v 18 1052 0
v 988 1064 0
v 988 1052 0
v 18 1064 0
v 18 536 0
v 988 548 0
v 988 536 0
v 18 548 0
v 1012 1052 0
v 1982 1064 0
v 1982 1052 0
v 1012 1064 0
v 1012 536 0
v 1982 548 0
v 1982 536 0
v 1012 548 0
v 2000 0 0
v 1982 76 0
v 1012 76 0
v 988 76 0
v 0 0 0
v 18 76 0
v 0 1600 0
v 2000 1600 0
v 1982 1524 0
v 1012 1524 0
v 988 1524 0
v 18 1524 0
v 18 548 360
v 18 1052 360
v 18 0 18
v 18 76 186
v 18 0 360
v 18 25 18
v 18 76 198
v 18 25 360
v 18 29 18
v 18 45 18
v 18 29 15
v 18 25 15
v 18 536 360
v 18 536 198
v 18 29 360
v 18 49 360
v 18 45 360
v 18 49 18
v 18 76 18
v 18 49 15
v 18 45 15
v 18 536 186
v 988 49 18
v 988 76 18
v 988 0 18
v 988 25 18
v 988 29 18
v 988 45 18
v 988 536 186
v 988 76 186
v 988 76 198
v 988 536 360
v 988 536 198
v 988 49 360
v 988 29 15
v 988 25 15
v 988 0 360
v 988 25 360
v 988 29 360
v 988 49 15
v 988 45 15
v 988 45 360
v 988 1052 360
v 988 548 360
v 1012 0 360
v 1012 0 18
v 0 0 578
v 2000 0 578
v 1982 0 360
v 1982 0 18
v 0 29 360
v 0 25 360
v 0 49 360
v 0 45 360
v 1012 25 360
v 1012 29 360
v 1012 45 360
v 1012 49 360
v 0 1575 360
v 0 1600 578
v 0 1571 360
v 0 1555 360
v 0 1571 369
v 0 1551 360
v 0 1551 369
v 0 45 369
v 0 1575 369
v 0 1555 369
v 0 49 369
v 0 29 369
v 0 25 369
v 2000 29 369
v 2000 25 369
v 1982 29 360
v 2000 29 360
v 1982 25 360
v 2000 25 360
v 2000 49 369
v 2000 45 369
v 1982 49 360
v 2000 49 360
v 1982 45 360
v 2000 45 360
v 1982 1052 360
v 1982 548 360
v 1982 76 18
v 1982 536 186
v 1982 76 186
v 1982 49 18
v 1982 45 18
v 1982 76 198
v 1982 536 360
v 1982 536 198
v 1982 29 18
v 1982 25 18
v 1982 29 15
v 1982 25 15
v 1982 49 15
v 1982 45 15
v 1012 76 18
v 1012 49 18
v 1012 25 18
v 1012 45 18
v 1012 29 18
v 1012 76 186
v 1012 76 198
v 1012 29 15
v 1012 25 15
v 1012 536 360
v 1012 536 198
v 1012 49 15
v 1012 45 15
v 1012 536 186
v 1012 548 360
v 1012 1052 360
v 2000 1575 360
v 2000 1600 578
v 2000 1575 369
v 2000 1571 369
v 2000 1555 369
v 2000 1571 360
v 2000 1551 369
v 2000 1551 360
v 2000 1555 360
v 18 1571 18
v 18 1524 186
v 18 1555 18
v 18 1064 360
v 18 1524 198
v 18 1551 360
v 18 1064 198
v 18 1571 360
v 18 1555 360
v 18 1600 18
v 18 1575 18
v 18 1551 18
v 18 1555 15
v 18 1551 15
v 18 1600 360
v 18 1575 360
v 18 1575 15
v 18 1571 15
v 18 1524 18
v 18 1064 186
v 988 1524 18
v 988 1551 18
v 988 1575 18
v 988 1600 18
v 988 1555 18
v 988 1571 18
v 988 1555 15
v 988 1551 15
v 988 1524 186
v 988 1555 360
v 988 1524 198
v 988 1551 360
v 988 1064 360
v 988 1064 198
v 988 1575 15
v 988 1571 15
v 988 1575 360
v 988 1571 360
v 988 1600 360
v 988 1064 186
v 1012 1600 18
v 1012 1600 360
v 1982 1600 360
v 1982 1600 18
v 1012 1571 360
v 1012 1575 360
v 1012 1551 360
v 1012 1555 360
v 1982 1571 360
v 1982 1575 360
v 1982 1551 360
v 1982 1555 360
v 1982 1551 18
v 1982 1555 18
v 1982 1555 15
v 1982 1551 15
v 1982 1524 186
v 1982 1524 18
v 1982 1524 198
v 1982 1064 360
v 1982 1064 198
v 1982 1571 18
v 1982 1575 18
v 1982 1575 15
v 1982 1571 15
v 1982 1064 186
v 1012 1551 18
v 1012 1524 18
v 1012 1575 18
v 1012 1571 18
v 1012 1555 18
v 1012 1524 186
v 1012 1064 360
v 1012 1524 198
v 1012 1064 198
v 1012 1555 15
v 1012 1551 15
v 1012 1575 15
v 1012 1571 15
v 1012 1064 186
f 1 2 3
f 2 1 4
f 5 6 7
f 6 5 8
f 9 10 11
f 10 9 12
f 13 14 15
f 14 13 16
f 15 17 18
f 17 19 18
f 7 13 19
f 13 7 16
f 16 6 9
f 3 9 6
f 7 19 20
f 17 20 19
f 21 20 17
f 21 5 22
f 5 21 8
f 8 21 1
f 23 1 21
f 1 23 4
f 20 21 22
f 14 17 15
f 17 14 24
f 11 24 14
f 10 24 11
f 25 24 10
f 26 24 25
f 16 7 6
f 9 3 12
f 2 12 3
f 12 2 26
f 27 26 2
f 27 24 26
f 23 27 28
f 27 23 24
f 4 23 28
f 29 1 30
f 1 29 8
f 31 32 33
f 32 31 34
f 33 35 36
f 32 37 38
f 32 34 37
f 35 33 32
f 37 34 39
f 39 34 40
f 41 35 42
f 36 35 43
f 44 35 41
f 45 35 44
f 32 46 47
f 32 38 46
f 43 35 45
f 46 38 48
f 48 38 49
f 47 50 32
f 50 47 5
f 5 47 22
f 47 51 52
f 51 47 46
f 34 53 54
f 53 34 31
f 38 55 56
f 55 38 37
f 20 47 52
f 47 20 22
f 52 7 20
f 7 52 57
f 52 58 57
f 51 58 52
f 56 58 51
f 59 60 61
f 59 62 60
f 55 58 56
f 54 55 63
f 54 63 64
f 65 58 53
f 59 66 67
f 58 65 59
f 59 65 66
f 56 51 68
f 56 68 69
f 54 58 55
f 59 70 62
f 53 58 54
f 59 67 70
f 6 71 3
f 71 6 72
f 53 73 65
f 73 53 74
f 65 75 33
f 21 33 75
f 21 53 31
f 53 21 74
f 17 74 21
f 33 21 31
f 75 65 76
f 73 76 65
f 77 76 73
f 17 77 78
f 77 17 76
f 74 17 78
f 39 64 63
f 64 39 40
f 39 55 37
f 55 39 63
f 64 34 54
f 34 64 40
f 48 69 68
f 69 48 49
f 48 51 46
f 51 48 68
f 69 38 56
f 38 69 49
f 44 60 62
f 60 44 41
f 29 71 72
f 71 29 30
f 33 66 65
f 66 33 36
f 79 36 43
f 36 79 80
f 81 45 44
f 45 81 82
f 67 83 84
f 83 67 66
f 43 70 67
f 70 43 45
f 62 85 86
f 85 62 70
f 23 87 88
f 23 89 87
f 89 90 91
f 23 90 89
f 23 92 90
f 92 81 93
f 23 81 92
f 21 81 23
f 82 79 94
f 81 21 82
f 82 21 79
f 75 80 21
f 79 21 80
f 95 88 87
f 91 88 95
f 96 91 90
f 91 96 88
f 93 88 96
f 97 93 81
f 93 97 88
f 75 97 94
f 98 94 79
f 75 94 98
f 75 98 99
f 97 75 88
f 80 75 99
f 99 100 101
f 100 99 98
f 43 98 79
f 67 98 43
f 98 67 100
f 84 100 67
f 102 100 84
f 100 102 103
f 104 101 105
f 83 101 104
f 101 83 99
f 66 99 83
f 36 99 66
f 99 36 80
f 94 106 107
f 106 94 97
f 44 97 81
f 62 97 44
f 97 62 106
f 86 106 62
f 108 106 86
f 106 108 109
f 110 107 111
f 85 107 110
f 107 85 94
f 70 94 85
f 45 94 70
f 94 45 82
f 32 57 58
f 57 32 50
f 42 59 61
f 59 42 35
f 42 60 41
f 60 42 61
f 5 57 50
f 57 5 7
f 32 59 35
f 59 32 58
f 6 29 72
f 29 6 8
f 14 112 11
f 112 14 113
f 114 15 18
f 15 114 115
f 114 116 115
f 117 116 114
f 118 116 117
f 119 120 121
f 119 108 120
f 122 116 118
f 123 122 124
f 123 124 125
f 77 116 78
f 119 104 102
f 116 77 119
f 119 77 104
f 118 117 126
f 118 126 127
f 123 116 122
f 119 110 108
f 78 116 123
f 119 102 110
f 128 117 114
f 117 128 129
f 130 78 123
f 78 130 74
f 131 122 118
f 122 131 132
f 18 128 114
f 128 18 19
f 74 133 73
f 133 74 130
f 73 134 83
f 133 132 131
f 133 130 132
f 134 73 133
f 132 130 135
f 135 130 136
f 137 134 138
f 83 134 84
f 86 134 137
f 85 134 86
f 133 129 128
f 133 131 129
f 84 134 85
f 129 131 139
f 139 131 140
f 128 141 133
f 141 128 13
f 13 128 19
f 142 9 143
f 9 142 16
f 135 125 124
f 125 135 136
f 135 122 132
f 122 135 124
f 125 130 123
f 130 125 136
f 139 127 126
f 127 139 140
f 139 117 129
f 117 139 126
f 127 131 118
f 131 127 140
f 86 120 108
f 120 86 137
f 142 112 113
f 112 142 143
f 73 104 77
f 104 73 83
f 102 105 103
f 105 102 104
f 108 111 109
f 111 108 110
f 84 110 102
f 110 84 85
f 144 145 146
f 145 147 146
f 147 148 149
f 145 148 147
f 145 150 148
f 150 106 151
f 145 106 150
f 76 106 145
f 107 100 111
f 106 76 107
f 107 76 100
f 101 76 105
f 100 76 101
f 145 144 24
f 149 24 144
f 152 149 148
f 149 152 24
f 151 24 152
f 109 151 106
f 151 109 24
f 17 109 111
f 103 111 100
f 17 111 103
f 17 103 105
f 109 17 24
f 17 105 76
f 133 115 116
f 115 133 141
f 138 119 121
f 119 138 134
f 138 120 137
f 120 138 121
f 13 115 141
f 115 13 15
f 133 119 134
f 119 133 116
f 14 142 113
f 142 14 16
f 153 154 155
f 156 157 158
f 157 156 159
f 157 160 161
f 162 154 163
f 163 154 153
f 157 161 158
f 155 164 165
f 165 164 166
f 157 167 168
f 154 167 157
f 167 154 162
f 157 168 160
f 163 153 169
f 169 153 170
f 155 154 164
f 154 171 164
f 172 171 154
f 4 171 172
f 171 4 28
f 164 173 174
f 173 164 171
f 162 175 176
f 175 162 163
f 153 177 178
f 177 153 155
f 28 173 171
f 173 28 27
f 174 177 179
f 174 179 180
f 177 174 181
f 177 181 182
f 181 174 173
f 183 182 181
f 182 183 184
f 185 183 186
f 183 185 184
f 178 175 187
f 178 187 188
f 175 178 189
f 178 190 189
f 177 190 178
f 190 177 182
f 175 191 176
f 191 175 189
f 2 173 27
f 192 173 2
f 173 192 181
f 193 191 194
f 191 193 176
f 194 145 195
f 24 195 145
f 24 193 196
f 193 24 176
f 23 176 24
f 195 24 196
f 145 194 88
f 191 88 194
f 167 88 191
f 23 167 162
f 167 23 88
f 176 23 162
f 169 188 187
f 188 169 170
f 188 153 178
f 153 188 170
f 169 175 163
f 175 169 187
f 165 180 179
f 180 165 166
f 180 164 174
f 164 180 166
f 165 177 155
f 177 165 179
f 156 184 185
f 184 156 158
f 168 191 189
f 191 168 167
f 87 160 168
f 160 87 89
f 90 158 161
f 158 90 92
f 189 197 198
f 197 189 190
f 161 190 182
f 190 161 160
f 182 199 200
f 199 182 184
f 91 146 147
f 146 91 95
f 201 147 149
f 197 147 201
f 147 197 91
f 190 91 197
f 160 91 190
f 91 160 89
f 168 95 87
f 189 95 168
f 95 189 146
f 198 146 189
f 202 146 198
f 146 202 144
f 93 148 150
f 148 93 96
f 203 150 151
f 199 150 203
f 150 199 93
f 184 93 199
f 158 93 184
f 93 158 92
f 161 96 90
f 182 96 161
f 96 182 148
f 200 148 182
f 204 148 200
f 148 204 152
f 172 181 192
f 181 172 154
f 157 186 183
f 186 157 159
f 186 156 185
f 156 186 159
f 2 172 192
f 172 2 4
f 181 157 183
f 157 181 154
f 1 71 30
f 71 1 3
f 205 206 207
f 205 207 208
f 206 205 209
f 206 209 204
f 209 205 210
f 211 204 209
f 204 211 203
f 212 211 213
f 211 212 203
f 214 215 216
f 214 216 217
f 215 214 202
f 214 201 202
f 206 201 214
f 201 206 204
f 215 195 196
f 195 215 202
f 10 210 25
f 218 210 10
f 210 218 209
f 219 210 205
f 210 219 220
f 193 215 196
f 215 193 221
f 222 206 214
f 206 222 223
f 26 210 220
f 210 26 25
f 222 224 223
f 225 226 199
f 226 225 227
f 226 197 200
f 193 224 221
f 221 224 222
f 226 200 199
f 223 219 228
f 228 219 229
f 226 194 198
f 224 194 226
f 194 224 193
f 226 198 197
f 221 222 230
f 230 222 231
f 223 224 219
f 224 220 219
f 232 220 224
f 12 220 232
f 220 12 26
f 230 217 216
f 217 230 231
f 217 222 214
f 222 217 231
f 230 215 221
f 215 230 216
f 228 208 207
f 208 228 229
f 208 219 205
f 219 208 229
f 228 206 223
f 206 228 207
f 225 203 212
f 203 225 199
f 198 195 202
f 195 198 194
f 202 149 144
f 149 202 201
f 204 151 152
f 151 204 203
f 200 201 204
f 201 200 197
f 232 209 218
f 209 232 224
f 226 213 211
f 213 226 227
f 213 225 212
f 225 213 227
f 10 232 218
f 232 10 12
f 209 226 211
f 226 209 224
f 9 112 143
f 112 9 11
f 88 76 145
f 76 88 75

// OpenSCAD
// Bed box, inspired by http://www.instructables.com/id/Box-Bed/?ALLSTEPS
// by Wholman of http://www.objectguerilla.com/
// (but metric units, not medieval)

// Global variables

// Standard panel sizes
full_panel_length=2440;
full_panel_width=1220;
saw_width=2.8;

// The mattress itself
mattress_width=1600;
mattress_length=2000;
mattress_height=200;

// Wood panels
panel_length=2440;
panel_width=1220;
panel_thick_height=18;
panel_thin_height=12;

// Box dimensions
box_width=800;
box_length=1000;
box_inner_height=360;
box_outer_height=box_inner_height+panel_thick_height;
box_inner_length=box_length-panel_thin_height-panel_thick_height;


// Panel modules
dado_offset_1=25;
dado_offset_2=45;
dado_width=4;//will require two difficult parallell circular saw cuts!!

door_track_height=panel_thick_height;
door_track_length=box_inner_length;
door_track_width=76;
door_track_dado_height=3;
door_track_dado_width=dado_width;
door_track_dado_offset_1=dado_offset_1;
door_track_dado_offset_2=dado_offset_2;

panel_side_thick_height=panel_thick_height;
panel_side_thick_width=box_inner_height;
panel_side_thick_length=box_width;

panel_side_thin_height=panel_thin_height;
panel_side_thin_width=box_inner_height;
panel_side_thin_length=box_width;

panel_top_height=panel_thick_height;
panel_top_width=box_width;
panel_top_length=box_length;
panel_top_dado_offset_1=dado_offset_1;
panel_top_dado_offset_2=dado_offset_2;
panel_top_dado_height=9;
panel_top_dado_width=dado_width;

shelf_height=panel_thin_height;
shelf_width=460;
shelf_length=box_inner_length;

stiffening_rib_height=panel_thin_height;
stiffening_rib_width=box_inner_height;
stiffening_rib_length=box_inner_length;

door_height=3;
door_width=box_inner_height-door_track_height+(panel_top_dado_height-door_track_dado_height);;
door_length=box_inner_length/2+40; // 40mm overlap between door panels


/*---------------------------------------
Parts
---------------------------------------*/
// Mattress
module mattress(){
    color("white") cube([mattress_width,mattress_length,mattress_height]);
}
// Box parts 2D
module door_left_2d(){
    difference(){
        square([door_length,door_width]);
        translate([50,door_width/2,0])
            circle(d=40);   
    }
}
module door_track_2d(){
    square([door_track_length,door_track_width]);
}
module panel_side_thick_2d(){
    square([panel_side_thick_length,panel_side_thick_width]);
}
module panel_side_thin_2d(){
    square([panel_side_thin_length,panel_side_thin_width]);
}
module panel_top_2d(){
    square([panel_top_length,panel_top_width]);
}
module shelf_2d(){
    square([shelf_length,shelf_width]);
}
module stiffening_rib_2d(){
    square([stiffening_rib_length,stiffening_rib_width]);
}

module thick_panel_1(){
    % square([full_panel_length,full_panel_width]);
    translate([panel_top_width,0]) rotate([0,0,90]) panel_top();
    translate([2*panel_top_width+ saw_width,0]) rotate([0,0,90]) panel_top();
    translate([3*panel_top_width+ 2*saw_width,0]) rotate([0,0,90]) panel_top();
    translate([0,panel_top_length+saw_width]) door_track();
    translate([0,panel_top_length+2*saw_width+door_track_width]) door_track();
    translate([door_track_length+saw_width,panel_top_length+saw_width]) door_track();
    translate([door_track_length+saw_width,panel_top_length+2*saw_width+door_track_width]) door_track();
}

module thick_panel_2(){
    % translate([full_panel_length+20,0]){
        square([full_panel_length,full_panel_width]);
        panel_top();
        translate([0,panel_top_width+saw_width]) panel_side_thick();
        translate([panel_top_length+saw_width,0]){
            panel_side_thick();
            translate([0,panel_side_thick_width+saw_width]) panel_side_thick();
            translate([0,2*(panel_side_thick_width+saw_width)]) panel_side_thick();
        }
    }    
}

module thin_panel_1(){
    translate([0,full_panel_width+20]){
    // first thin panel
    % square([full_panel_length,full_panel_width]);
    shelf();
    translate([shelf_length+saw_width,0])
        shelf();
    translate([0,shelf_width+saw_width])
        stiffening_rib();
    translate([shelf_length+saw_width,shelf_width+saw_width])
        stiffening_rib();
    translate([0,shelf_width+stiffening_rib_width+2*saw_width])
        stiffening_rib();
    translate([shelf_length+saw_width,shelf_width+stiffening_rib_width+2*saw_width])
        stiffening_rib();
    translate([2*(shelf_length+saw_width)+shelf_width,0])
        rotate([0,0,90])
            shelf();
    }
}
module thin_panel_2(){
    translate([full_panel_length+20,full_panel_width+20]){
        % square([full_panel_length,full_panel_width]);
        translate([shelf_width,0])
            rotate([0,0,90])
                shelf();
        translate([shelf_width+saw_width+panel_side_thin_width,0])
            rotate([0,0,90])
                panel_side_thin();
        translate([shelf_width+2*(saw_width+panel_side_thin_width),0])
            rotate([0,0,90])
                panel_side_thin();
        translate([shelf_width+3*(saw_width+panel_side_thin_width),0])
            rotate([0,0,90])
                panel_side_thin();
        translate([shelf_width+saw_width,panel_side_thin_length+saw_width])
                panel_side_thin();
    }
}
// Box parts 3D
module door_left(){
    % linear_extrude(door_height) door_left_2d();
}
module door_right(){
    translate([door_length,0,0])
        mirror([1,0,0])
            % door_left();
}
module door_track(){
    difference(){
        color("brown") linear_extrude(door_track_height) door_track_2d();
        translate([0,door_track_dado_offset_1,door_track_height-door_track_dado_height])
            cube([door_track_length,door_track_dado_width,door_track_dado_height]);
        translate([0,door_track_dado_offset_2,door_track_height-door_track_dado_height])
            cube([door_track_length,door_track_dado_width,door_track_dado_height]);
    }
    text=str("door track:",door_track_length,"mm* ",door_track_width,"mm *",door_track_height,"mm");
    translate([door_track_length/2, door_track_width/2, door_track_height])
        color("yellow") {
            text(halign="center", valign="center", text=text, size=20);
   }
}
module panel_side_thick(){
    color("brown") linear_extrude(panel_side_thick_height) panel_side_thick_2d();
    text=str("panel side thick:",panel_side_thick_length,"mm* ",panel_side_thick_width,"mm *",panel_side_thick_height,"mm");
    translate([panel_side_thick_length/2, panel_side_thick_width/2, panel_side_thick_height])
        color("yellow") {
            text(halign="center", valign="center", text=text, size=20);
   }
}
module panel_side_thin(){
    linear_extrude(panel_side_thin_height) panel_side_thin_2d();
    text=str("panel side thin:",panel_side_thin_length,"mm* ",panel_side_thin_width,"mm *",panel_side_thin_height,"mm");
    translate([panel_side_thin_length/2, panel_side_thin_width/2, panel_side_thin_height])
        color("blue") {
            text(halign="center", valign="center", text=text, size=20);
   }
}
module panel_top(){
    difference(){
        color("brown") linear_extrude(panel_top_height) panel_top_2d();
        translate([0,panel_top_dado_offset_1,0])
            cube([panel_top_length, panel_top_dado_width,panel_top_dado_height]);
        translate([0,panel_top_dado_offset_2,0])
            cube([panel_top_length, panel_top_dado_width,panel_top_dado_height]);
    }
    text=str("panel top:",panel_top_length,"mm* ",panel_top_width,"mm *",panel_top_height,"mm");
    translate([panel_top_length/2, panel_top_width/2, panel_top_height])
        color("yellow") {
            text(halign="center", valign="center", text=text, size=20);
   }
}
module shelf(){
    linear_extrude(shelf_height) shelf_2d();
    text=str("shelf:",shelf_length,"mm* ",shelf_width,"mm *",shelf_height,"mm");
    translate([shelf_length/2, shelf_width/2, shelf_height])
        color("blue") {
            text(halign="center", valign="center", text=text, size=20);
   }
}
module stiffening_rib(){
    linear_extrude(stiffening_rib_height) stiffening_rib_2d();
    text=str("stiffening rib:",stiffening_rib_length,"mm* ",stiffening_rib_width,"mm *",stiffening_rib_height,"mm");
    translate([stiffening_rib_length/2, stiffening_rib_width/2, stiffening_rib_height])
        color("blue") {
            text(halign="center", valign="center", text=text, size=20);
   }
}

// One box 3D
module box(){
    translate([panel_thick_height,0,0])
        door_track();
    rotate([90,0,90])
        panel_side_thick();
    translate([box_length-panel_side_thin_height,0,0])
        rotate([90,0,90])
            panel_side_thin();
    translate([0,0,box_inner_height])
        panel_top();
    translate([panel_side_thick_height,door_track_width,(box_inner_height+shelf_height)/2])
        shelf();
    translate([panel_thick_height,door_track_width+shelf_width+stiffening_rib_height,0])
        rotate([90,0,0])
            stiffening_rib();
    translate([panel_side_thick_height,door_track_dado_offset_1+(door_height+dado_width)/2,door_track_height-door_track_dado_height])
        rotate([90,0,0])
            door_left();
    translate([box_inner_length-door_length+panel_side_thick_height,door_track_dado_offset_2+(door_height+dado_width)/2,door_track_height-door_track_dado_height])
        rotate([90,0,0])
            door_right();
}
// All four boxes 3D
module boxes(){
    box();
    translate([2*box_length,0,0])
        mirror([1,0,0])
            box();
    translate([0,2*box_width,0]){
        mirror([0,1,0]){
            box();
            translate([2*box_length,0,0])
                mirror([1,0,0])
                    box();
        }
    }
}

/*----------------------------------------
Build it!
Set 3d=1 for 3d view, or 3d=0 for 2d view.
----------------------------------------*/
3d=1;

if (3d){
    // 3D view
    boxes();
    translate([mattress_length,0,box_outer_height])
        rotate([0,0,90])
            mattress();    
} else {
    // 2D view
    thick_panel_1();
    thick_panel_2();
    
    thin_panel_1();
    thin_panel_2();
}
